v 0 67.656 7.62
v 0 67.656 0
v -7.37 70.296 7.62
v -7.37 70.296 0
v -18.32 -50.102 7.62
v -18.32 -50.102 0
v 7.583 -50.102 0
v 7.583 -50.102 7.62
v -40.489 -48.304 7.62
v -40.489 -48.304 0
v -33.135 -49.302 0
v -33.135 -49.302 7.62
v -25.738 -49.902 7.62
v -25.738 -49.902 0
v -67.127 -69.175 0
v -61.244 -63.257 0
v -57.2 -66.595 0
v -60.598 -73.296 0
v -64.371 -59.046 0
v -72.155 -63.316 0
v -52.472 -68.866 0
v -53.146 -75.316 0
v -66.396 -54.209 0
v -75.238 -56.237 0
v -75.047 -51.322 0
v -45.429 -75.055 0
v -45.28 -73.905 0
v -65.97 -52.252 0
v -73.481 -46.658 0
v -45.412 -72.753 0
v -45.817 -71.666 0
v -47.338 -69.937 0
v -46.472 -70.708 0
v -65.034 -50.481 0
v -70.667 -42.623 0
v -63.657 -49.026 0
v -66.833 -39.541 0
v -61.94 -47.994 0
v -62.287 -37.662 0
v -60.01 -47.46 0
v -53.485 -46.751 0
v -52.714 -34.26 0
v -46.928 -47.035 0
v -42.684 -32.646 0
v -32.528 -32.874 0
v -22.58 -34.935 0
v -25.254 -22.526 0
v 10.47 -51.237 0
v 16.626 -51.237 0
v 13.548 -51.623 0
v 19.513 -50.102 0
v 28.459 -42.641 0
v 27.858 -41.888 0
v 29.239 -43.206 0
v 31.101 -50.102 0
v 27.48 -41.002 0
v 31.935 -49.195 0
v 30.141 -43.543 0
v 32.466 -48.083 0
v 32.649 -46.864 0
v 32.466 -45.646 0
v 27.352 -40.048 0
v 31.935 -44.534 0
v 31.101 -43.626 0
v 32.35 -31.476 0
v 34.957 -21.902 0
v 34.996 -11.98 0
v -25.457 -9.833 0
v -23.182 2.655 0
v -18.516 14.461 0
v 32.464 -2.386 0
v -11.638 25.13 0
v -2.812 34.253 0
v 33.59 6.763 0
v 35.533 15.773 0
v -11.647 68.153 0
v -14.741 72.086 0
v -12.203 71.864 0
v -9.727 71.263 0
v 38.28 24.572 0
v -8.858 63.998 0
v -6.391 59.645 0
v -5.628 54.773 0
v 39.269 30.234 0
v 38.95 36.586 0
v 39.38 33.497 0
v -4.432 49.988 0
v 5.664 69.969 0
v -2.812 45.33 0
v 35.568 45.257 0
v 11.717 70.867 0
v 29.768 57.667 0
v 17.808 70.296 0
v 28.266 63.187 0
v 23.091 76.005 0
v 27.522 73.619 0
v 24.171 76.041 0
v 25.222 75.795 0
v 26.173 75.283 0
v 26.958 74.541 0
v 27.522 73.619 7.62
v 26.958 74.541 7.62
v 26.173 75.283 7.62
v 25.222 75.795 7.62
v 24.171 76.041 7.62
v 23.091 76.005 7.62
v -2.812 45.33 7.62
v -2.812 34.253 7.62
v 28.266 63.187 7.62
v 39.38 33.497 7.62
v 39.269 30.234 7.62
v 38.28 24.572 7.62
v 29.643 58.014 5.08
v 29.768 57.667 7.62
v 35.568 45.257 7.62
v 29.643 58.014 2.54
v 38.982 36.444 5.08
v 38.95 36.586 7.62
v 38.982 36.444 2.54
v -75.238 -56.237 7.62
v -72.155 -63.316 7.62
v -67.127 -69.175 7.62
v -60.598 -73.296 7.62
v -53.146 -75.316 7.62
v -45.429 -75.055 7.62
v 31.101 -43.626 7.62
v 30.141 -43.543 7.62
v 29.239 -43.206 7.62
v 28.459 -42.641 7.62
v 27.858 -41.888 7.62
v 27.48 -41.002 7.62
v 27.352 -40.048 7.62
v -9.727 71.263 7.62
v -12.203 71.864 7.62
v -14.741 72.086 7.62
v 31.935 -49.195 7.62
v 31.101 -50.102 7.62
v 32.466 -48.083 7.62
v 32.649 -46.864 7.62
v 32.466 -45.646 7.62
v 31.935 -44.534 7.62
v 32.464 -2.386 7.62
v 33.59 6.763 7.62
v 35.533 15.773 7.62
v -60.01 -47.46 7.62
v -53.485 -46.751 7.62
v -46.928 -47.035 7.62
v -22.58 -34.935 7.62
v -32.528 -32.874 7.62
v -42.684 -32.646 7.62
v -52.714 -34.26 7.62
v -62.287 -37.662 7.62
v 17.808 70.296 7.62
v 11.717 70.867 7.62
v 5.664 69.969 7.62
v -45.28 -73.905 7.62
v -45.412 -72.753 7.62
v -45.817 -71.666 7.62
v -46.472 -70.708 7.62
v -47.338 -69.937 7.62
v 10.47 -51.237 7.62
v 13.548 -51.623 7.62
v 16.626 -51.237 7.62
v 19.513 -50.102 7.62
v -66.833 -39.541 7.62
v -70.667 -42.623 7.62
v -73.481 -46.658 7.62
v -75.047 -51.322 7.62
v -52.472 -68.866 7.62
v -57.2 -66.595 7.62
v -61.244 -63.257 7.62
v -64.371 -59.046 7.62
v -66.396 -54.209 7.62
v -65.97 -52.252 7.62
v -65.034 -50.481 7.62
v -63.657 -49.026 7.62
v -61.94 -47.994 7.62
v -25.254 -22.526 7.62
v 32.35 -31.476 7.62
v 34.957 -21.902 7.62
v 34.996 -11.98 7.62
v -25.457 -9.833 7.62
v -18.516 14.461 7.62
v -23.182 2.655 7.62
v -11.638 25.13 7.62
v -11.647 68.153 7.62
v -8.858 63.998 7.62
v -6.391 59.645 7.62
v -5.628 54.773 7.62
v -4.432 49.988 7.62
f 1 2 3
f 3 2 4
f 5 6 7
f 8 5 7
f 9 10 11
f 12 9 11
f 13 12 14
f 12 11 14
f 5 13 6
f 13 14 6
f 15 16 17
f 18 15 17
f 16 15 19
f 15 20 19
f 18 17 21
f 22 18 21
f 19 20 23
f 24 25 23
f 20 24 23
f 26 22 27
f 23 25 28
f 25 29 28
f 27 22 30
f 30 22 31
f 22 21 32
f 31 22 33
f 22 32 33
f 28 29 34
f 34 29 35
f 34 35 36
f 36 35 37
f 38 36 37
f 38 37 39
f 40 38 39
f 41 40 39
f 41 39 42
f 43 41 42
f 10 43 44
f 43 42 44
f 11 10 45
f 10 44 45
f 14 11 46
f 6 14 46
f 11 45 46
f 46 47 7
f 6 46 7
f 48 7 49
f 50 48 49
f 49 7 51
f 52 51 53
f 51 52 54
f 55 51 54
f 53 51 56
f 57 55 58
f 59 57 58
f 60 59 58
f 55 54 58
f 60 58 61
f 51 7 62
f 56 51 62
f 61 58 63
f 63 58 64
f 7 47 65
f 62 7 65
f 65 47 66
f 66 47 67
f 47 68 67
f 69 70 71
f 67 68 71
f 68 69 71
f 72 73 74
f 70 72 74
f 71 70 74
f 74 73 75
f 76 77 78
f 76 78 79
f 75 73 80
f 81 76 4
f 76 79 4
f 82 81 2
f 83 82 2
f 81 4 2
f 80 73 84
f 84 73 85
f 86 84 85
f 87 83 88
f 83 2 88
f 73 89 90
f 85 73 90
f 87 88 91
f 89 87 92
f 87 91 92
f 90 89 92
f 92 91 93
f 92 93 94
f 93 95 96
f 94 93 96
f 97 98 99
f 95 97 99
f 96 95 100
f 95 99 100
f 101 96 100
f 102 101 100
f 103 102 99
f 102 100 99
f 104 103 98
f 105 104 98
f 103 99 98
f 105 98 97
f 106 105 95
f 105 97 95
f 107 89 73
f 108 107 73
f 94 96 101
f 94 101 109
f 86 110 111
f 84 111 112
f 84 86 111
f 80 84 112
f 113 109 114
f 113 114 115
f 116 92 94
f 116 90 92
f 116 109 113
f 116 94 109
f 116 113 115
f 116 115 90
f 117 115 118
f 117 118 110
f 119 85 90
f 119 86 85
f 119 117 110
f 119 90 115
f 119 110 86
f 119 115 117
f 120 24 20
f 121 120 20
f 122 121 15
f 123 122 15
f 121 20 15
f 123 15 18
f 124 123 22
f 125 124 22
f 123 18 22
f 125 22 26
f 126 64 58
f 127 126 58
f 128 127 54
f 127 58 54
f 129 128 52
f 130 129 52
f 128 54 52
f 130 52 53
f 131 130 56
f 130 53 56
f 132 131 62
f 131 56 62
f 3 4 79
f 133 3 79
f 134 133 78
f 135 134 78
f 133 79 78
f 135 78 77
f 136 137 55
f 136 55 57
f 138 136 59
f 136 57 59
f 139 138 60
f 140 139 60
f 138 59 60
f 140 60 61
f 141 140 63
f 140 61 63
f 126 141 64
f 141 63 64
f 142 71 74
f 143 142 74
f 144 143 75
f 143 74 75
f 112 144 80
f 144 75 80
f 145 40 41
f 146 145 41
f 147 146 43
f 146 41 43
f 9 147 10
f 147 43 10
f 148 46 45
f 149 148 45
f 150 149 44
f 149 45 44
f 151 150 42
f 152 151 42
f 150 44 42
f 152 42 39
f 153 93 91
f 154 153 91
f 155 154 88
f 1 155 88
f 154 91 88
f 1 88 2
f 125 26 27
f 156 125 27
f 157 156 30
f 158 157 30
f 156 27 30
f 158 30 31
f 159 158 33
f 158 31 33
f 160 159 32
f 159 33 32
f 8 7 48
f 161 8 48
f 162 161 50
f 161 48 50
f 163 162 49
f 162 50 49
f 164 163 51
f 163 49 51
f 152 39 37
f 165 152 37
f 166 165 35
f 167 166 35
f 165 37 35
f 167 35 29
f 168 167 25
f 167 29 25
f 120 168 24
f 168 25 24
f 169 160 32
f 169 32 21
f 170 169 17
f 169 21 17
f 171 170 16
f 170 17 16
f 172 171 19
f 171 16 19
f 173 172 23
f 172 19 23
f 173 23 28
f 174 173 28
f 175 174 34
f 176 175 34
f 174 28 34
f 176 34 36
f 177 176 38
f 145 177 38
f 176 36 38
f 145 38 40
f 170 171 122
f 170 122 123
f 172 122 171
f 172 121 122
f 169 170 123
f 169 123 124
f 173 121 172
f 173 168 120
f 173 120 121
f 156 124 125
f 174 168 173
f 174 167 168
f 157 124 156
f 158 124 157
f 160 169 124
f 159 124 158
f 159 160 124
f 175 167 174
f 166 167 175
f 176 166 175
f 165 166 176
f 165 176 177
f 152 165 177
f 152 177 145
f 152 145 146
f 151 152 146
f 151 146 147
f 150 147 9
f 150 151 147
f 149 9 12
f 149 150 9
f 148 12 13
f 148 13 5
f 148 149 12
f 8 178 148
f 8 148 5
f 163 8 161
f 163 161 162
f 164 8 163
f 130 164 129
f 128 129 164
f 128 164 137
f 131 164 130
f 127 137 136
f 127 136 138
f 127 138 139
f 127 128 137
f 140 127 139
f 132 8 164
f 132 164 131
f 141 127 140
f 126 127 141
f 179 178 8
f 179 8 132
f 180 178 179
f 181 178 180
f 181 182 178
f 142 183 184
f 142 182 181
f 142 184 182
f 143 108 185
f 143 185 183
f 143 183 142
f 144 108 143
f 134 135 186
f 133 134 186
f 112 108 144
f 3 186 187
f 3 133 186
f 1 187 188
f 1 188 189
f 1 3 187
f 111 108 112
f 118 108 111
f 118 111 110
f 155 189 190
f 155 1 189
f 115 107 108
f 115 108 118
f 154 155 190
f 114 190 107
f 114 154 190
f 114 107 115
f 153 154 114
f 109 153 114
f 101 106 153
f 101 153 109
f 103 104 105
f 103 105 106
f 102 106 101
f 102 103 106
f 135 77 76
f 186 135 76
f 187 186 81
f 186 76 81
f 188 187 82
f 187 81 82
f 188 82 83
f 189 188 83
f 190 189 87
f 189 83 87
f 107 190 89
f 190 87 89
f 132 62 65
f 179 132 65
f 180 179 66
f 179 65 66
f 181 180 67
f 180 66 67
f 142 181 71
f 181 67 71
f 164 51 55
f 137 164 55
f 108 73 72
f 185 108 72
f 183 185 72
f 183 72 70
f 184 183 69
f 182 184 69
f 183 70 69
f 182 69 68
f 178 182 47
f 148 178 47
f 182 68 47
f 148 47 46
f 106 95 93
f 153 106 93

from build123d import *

# Parameters (mm, degrees)
F1_DEPTH = 7.62


with BuildPart() as f1:
    # F0 (on Top) → F1 (new body)
    with BuildSketch(Plane.XY):
        with BuildLine():
            Line((23.0912789702, 76.0052353144), (17.8084038198, 70.2963247895))
            ThreePointArc((17.8084038198, 70.2963247895), (8.6634944394, 70.6002323484), (0, 67.6564946771))
            Line((0, 67.6564946771), (-7.3704631068, 70.2963247895))
            ThreePointArc((-7.3704631068, 70.2963247895), (-10.9539259189, 71.6101956409), (-14.7409262136, 72.085686028))
            ThreePointArc((-14.7409262136, 72.085686028), (-10.213242371, 66.1021431066), (-6.3905753195, 59.6453696489))
            ThreePointArc((-6.3905753195, 59.6453696489), (-5.0838681181, 52.3672612966), (-2.8118535411, 45.3304797411))
            Line((-2.8118535411, 45.3304797411), (-2.8118535411, 41.7517572641))
            Line((-2.8118535411, 41.7517572641), (-2.8118535411, 34.2534817755))
            ThreePointArc((-2.8118535411, 34.2534817755), (-23.1818973657, 2.6551564858), (-22.5800313056, -34.9351428449))
            ThreePointArc((-22.5800313056, -34.9351428449), (-42.6842106724, -32.6463068594), (-62.2868053615, -37.6617908478))
            ThreePointArc((-62.2868053615, -37.6617908478), (-72.2180153419, -44.540137131), (-75.2383731306, -56.2370605767))
            ThreePointArc((-75.2383731306, -56.2370605767), (-64.0161548515, -71.4793290405), (-45.4291552305, -75.0554129481))
            ThreePointArc((-45.4291552305, -75.0554129481), (-45.5811738976, -72.1967918586), (-47.3380211435, -69.9366343501))
            ThreePointArc((-47.3380211435, -69.9366343501), (-59.3231701644, -65.0485814613), (-66.3964748383, -54.208599031))
            ThreePointArc((-66.3964748383, -54.208599031), (-64.3950240146, -49.7065480026), (-60.0098781288, -47.4604927003))
            ThreePointArc((-60.0098781288, -47.4604927003), (-50.2011220543, -46.7688928413), (-40.4885821044, -48.3040064573))
            ThreePointArc((-40.4885821044, -48.3040064573), (-29.4405166496, -49.6518451362), (-18.3196496218, -50.1021072268))
            Line((-18.3196496218, -50.1021072268), (7.583483588, -50.1021072268))
            ThreePointArc((7.583483588, -50.1021072268), (13.5480200406, -51.6228464718), (19.5125564933, -50.1021072268))
            Line((19.5125564933, -50.1021072268), (31.1008002609, -50.1021072268))
            ThreePointArc((31.1008002609, -50.1021072268), (32.6485228526, -46.8642171472), (31.1008002609, -43.6263270676))
            ThreePointArc((31.1008002609, -43.6263270676), (28.4590448896, -42.6406855761), (27.3516643792, -40.0476045907))
            ThreePointArc((27.3516643792, -40.0476045907), (34.956966389, -21.9021038691), (32.4641223997, -2.3858146742))
            ThreePointArc((32.4641223997, -2.3858146742), (34.4601677821, 11.2898780989), (38.2795948535, 24.5722252876))
            add(Edge.make_bspline(
                [(27.5220777839, 73.6194252968), (27.5909354629, 68.6808290163), (27.6540694888, 57.7061514867), (41.4414505958, 37.0315643617), (38.9570749828, 28.2342427003), (38.2795948535, 24.5722252876)],
                knots=[0, 0, 0, 0, 0.3235605926, 0.7188381297, 1, 1, 1, 1], degree=3))
            ThreePointArc((27.5220777839, 73.6194252968), (25.7147995787, 75.5702711821), (23.0912789702, 76.0052353144))
        make_face()
    extrude(amount=F1_DEPTH)


solid = f1.part
